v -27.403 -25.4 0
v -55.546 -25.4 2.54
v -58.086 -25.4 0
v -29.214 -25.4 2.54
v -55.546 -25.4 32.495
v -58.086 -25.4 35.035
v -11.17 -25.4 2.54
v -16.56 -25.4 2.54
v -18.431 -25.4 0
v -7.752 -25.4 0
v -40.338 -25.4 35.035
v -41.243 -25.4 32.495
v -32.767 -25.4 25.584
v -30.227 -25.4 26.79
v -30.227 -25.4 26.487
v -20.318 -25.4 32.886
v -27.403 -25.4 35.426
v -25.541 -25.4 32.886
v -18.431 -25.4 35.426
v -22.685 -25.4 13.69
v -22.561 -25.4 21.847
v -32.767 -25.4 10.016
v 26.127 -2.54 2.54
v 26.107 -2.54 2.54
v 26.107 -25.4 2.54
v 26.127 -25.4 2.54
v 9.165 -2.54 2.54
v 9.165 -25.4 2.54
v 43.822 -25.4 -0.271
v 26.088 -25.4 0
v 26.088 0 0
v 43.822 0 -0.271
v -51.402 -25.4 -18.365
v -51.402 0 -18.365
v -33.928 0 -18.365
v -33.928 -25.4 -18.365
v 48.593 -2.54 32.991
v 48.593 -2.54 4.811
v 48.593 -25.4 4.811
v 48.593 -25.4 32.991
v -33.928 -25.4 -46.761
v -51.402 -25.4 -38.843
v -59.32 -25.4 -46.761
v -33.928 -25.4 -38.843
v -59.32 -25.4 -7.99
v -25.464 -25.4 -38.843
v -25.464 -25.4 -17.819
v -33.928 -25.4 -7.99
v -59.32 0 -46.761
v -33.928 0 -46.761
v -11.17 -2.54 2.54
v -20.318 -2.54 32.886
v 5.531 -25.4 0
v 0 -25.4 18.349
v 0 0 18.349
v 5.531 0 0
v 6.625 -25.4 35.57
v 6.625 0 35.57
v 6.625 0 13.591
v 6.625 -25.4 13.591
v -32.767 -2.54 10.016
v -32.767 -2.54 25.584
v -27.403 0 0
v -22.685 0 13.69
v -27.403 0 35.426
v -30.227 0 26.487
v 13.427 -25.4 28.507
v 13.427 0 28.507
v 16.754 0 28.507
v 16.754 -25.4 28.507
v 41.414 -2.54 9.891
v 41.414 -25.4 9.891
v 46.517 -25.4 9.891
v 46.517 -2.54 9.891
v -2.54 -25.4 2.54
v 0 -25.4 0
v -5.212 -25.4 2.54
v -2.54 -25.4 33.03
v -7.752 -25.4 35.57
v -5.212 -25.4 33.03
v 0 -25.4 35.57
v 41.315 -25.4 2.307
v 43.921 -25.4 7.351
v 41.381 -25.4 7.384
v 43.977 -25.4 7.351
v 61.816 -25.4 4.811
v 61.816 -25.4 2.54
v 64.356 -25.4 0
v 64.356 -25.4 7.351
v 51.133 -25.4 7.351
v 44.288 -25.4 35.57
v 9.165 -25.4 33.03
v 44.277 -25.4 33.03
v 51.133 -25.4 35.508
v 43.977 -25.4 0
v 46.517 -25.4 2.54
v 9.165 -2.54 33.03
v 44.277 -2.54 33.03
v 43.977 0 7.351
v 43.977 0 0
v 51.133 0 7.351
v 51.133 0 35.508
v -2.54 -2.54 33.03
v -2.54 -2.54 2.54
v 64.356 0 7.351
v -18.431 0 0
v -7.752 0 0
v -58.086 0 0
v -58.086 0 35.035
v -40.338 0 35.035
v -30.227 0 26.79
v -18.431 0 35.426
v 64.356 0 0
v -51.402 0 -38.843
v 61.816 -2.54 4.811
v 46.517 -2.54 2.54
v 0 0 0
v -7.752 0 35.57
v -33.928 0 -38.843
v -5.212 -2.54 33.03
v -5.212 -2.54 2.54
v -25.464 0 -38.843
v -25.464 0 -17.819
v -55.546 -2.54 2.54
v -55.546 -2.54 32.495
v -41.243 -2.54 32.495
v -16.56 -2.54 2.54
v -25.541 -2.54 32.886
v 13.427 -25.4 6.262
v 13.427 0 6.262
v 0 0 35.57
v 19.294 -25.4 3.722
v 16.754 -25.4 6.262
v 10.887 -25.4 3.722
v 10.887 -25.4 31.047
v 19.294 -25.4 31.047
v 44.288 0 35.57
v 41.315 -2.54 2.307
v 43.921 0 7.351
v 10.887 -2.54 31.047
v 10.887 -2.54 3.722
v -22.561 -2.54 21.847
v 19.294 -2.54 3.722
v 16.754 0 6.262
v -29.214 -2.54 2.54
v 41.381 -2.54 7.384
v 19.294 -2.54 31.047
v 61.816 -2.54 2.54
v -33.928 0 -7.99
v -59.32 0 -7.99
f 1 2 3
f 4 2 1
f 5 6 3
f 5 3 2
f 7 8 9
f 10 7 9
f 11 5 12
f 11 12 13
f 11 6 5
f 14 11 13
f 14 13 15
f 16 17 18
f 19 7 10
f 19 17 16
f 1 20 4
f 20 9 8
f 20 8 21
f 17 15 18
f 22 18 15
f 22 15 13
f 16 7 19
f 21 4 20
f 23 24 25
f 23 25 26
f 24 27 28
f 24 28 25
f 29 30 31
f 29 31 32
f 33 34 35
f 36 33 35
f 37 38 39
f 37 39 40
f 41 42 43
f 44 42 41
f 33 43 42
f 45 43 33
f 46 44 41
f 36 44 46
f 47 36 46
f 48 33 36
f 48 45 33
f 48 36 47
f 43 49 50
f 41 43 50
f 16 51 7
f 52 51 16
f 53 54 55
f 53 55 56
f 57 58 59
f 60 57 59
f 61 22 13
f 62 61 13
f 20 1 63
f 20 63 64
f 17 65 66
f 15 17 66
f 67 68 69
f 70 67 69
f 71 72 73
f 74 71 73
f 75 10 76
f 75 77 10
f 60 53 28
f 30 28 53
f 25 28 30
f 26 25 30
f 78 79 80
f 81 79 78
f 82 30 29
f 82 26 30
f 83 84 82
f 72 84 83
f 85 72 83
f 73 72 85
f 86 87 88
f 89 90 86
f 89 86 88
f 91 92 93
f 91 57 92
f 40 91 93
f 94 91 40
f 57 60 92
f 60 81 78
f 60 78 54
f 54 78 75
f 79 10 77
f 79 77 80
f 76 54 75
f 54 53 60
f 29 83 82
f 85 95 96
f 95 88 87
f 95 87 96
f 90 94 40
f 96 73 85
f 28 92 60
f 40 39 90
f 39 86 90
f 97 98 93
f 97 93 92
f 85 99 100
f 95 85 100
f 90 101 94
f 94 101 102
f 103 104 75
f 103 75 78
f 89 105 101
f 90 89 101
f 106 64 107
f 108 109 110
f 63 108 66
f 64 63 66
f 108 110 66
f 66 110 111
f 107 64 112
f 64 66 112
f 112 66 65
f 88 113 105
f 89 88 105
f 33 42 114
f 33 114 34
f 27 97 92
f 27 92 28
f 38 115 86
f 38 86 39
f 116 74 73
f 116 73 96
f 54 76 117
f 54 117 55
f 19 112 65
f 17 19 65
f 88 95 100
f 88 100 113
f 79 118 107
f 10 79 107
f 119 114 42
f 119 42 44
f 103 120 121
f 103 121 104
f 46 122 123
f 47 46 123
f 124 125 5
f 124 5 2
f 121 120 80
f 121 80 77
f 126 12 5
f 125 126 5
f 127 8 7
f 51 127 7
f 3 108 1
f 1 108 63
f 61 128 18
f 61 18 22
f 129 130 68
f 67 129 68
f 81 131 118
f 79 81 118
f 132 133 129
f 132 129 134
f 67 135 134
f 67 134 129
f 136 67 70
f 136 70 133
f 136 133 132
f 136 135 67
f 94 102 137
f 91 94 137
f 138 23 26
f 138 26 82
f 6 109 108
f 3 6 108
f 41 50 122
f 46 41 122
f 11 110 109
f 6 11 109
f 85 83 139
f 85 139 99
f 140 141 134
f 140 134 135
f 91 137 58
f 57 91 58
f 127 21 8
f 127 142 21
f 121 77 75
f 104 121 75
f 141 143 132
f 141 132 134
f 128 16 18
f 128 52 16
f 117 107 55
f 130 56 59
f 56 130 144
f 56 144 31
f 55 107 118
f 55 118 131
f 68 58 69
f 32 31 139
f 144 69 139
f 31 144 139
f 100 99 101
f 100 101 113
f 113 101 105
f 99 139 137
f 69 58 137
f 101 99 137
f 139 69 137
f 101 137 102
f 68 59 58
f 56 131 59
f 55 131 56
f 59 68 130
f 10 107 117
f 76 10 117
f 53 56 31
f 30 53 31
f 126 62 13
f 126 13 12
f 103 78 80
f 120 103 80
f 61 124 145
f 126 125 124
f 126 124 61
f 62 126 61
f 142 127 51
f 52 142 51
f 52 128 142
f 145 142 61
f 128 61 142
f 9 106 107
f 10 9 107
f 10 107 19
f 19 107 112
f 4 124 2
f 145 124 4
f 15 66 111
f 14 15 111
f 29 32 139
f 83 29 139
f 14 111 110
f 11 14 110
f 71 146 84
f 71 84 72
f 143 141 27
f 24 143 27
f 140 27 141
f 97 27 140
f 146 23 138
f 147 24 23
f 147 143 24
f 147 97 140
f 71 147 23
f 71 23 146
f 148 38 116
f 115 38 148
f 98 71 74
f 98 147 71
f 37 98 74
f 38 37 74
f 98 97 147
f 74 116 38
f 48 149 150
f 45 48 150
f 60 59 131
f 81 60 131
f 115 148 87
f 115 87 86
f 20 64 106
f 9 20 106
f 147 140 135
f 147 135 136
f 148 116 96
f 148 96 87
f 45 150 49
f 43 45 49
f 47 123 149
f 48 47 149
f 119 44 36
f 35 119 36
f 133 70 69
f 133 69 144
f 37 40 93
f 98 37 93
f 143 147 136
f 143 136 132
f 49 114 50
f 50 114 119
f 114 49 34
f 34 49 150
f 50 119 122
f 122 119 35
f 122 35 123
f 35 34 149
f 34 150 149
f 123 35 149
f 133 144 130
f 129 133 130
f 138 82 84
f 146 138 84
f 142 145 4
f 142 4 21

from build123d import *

# Parameters (mm, degrees)
F1_DEPTH    = 25.4
F3_DEPTH    = 25.4
F4_T        = -2.54
F5_T        = 2.54
F5_T3_DEPTH = 30.48
F6_W        = 17.4741521478
F6_H        = 20.4775221646
F7_DEPTH    = 25.4


# Not quite as in the source:
# - a shell that OpenCascade refuses in one call is made with other operations: the cavity is built on its own and cut out


with BuildPart() as f1:
    # F0 (on Front) → F1 (new body)
    with BuildSketch(Plane.XZ):
        Polygon((-7.751853343, 35.5700217187), (-7.751853343, 0), (0, 0), (0, 18.349380202), (5.5311000617, 0), (13.4272025898, 0), (13.4272025898, 5.9511377476), (13.4272025898, 6.2622595578), (13.4272025898, 28.5074785352), (13.4272025898, 35.5700217187), (6.6250464879, 35.5700217187), (6.6250464879, 13.591483), (0, 35.5700217187), align=None)
        Polygon((13.4272025898, 5.9511377476), (13.4272025898, 0), (26.0876882821, 0), (43.8216403127, -0.2713031718), (43.9208918573, 7.3511856608), (44.1983910351, 28.6630392075), (44.2883260548, 35.5700217187), (26.0876882821, 35.5700217187), (13.4272025898, 35.5700217187), (13.4272025898, 28.5074785352), (16.7540293187, 28.5074785352), (16.7540293187, 6.2622595578), (13.4272025898, 6.2622595578), align=None)
        Polygon((51.1330030859, 35.5077236891), (44.2883260548, 35.5700217187), (44.2883260548, 28.6630392075), (44.1983910351, 28.6630392075), (43.9208918573, 7.3511856608), (43.977200985, 7.3511856608), (43.977200985, 0), (64.355686307, 0), (64.355686307, 7.3511856608), (51.1330030859, 7.3511856608), align=None)
        Polygon((44.2883260548, 28.6630392075), (44.2883260548, 35.5700217187), (44.1983910351, 28.6630392075), align=None)
    extrude(amount=F1_DEPTH)

    # F5: shell of thickness 2.54, made by hand


with BuildPart() as f1b:
    # F0 (on Front) → F1, piece 2 (new body)
    with BuildSketch(Plane.XZ):
        Polygon((-27.4027399719, 35.4263968766), (-38.5948903859, 0), (-27.4027399719, 0), (-22.6853881031, 13.6895719916), (-18.4305217117, 0), (-7.751853343, 0), (-18.4305217117, 35.4263968766), align=None)
    extrude(amount=F1_DEPTH)

    # F2 (on Front) → F3 (join)
    with BuildSketch(Plane.XZ):
        Polygon((-58.0855421722, 35.0350737572), (-58.0855421722, 0), (-38.4715683758, 0), (-30.226835981, 11.0594791437), (-30.226835981, 26.7903394997), (-40.3383001685, 35.0350737572), align=None)
    extrude(amount=F3_DEPTH)

    # F4
    f4_openings = [f1b.faces().sort_by_distance(p)[0] for p in [
        (-36.054344, -25.4, 16.831568),
    ]]
    offset(amount=F4_T, openings=f4_openings, kind=Kind.INTERSECTION)


with BuildPart() as f5_core1:
    # F5_t2: copy of F1
    add(f1.part)

    # the walls: a layer under each face that stays
    f5_faces = [f5_core1.faces().sort_by_distance(p)[0] for p in [
        (47.7106645703, -12.7, 35.5388727039),
        (25.4566862714, -12.7, 35.5700217187),
        (6.6250464879, -12.7, 24.5807523594),
        (3.3125232439, -12.7, 24.5807523594),
        (-3.8759266715, -12.7, 35.5700217187),
        (-7.751853343, -12.7, 17.7850108594),
        (-3.8759266715, -12.7, 0),
        (0, -12.7, 9.174690101),
        (2.7655500308, -12.7, 9.174690101),
        (15.8093941719, -12.7, 0),
        (34.9546642974, -12.7, -0.1356515859),
        (43.871266085, -12.7, 3.5399412445),
        (43.9490464211, -12.7, 7.3511856608),
        (43.977200985, -12.7, 3.6755928304),
        (54.166443646, -12.7, 0),
        (64.355686307, -12.7, 3.6755928304),
        (57.7443446964, -12.7, 7.3511856608),
        (51.1330030859, -12.7, 21.4294546749),
        (13.4272025898, -12.7, 17.3848690465),
        (15.0906159543, -12.7, 28.5074785352),
        (16.7540293187, -12.7, 17.3848690465),
        (15.0906159543, -12.7, 6.2622595578),
        (28.301916482, 0, 17.6493592735),
    ]]
    thicken(f5_faces, amount=-F5_T, mode=Mode.SUBTRACT)

    # F5_s4 → F5_t3 (cut)
    with BuildSketch(Plane.XZ.offset(-2.54)):
        Polygon((6.6239656661, 13.5988135914), (9.1650464879, 13.591483), (9.1650464879, -3.6358737387), (4.1931286643, 12.8584238625), align=None)
        Polygon((0.0010808218, 18.3420496106), (-2.54, 18.349380202), (-2.54, 35.5767369407), (2.4319178236, 19.0824393395), align=None)
        Polygon((26.0872997453, -0.0507970282), (26.0876882821, 2.54), (26.1071162624, 2.54), (26.1265419696, 2.5397028155), align=None)
        Polygon((43.9462897044, 7.3254549584), (41.3811071501, 7.3842559035), (41.4137495922, 9.8911856608), (43.9208918573, 9.8911856608), align=None)
        Polygon((43.951800985, 7.3257856608), (43.977200985, 9.8911856608), (46.517200985, 9.8911856608), (46.517200985, 7.3511856608), align=None)
        Polygon((51.1584030859, 7.3765856608), (51.1330030859, 4.8111856608), (48.5930030859, 4.8111856608), (48.5930030859, 7.3511856608), align=None)
        Polygon((13.4526025898, 6.2876595578), (10.8872025898, 6.2622595578), (10.8872025898, 3.7222595578), (13.4272025898, 3.7222595578), align=None)
        Polygon((13.4526025898, 28.4820785352), (10.8872025898, 28.5074785352), (10.8872025898, 31.0474785352), (13.4272025898, 31.0474785352), align=None)
        Polygon((16.7286293187, 28.4820785352), (16.7540293187, 31.0474785352), (19.2940293187, 31.0474785352), (19.2940293187, 28.5074785352), align=None)
        Polygon((16.7286293187, 6.2876595578), (19.2940293187, 6.2622595578), (19.2940293187, 3.7222595578), (16.7540293187, 3.7222595578), align=None)
    extrude(amount=F5_T3_DEPTH, mode=Mode.SUBTRACT)


with BuildPart() as f1_1:
    add(f1.part)

    # what is left inside the walls is the cavity
    f5_cavity = [f5_core1.part.solids().sort_by_distance(p)[0] for p in [
        (35.490366, -2.5654, 12.548235),
        (-5.186453, -17.78, 17.785011),
    ]]
    add(f5_cavity, mode=Mode.SUBTRACT)


with BuildPart() as f7:
    # F6 (on Front) → F7 (new body)
    with BuildSketch(Plane.XZ):
        Polygon((-33.9281708002, -7.9899784178), (-59.3202970922, -7.9899784178), (-59.3202970922, -46.7607527971), (-33.9281708002, -46.7607527971), (-25.4641305655, -38.8427786529), (-25.4641305655, -17.8191885352), align=None)
        with Locations((-42.6652468741, -28.6040175706)):
            Rectangle(F6_W, F6_H, mode=Mode.SUBTRACT)
    extrude(amount=F7_DEPTH)


solid = Compound([f1b.part, f1_1.part, f7.part])
